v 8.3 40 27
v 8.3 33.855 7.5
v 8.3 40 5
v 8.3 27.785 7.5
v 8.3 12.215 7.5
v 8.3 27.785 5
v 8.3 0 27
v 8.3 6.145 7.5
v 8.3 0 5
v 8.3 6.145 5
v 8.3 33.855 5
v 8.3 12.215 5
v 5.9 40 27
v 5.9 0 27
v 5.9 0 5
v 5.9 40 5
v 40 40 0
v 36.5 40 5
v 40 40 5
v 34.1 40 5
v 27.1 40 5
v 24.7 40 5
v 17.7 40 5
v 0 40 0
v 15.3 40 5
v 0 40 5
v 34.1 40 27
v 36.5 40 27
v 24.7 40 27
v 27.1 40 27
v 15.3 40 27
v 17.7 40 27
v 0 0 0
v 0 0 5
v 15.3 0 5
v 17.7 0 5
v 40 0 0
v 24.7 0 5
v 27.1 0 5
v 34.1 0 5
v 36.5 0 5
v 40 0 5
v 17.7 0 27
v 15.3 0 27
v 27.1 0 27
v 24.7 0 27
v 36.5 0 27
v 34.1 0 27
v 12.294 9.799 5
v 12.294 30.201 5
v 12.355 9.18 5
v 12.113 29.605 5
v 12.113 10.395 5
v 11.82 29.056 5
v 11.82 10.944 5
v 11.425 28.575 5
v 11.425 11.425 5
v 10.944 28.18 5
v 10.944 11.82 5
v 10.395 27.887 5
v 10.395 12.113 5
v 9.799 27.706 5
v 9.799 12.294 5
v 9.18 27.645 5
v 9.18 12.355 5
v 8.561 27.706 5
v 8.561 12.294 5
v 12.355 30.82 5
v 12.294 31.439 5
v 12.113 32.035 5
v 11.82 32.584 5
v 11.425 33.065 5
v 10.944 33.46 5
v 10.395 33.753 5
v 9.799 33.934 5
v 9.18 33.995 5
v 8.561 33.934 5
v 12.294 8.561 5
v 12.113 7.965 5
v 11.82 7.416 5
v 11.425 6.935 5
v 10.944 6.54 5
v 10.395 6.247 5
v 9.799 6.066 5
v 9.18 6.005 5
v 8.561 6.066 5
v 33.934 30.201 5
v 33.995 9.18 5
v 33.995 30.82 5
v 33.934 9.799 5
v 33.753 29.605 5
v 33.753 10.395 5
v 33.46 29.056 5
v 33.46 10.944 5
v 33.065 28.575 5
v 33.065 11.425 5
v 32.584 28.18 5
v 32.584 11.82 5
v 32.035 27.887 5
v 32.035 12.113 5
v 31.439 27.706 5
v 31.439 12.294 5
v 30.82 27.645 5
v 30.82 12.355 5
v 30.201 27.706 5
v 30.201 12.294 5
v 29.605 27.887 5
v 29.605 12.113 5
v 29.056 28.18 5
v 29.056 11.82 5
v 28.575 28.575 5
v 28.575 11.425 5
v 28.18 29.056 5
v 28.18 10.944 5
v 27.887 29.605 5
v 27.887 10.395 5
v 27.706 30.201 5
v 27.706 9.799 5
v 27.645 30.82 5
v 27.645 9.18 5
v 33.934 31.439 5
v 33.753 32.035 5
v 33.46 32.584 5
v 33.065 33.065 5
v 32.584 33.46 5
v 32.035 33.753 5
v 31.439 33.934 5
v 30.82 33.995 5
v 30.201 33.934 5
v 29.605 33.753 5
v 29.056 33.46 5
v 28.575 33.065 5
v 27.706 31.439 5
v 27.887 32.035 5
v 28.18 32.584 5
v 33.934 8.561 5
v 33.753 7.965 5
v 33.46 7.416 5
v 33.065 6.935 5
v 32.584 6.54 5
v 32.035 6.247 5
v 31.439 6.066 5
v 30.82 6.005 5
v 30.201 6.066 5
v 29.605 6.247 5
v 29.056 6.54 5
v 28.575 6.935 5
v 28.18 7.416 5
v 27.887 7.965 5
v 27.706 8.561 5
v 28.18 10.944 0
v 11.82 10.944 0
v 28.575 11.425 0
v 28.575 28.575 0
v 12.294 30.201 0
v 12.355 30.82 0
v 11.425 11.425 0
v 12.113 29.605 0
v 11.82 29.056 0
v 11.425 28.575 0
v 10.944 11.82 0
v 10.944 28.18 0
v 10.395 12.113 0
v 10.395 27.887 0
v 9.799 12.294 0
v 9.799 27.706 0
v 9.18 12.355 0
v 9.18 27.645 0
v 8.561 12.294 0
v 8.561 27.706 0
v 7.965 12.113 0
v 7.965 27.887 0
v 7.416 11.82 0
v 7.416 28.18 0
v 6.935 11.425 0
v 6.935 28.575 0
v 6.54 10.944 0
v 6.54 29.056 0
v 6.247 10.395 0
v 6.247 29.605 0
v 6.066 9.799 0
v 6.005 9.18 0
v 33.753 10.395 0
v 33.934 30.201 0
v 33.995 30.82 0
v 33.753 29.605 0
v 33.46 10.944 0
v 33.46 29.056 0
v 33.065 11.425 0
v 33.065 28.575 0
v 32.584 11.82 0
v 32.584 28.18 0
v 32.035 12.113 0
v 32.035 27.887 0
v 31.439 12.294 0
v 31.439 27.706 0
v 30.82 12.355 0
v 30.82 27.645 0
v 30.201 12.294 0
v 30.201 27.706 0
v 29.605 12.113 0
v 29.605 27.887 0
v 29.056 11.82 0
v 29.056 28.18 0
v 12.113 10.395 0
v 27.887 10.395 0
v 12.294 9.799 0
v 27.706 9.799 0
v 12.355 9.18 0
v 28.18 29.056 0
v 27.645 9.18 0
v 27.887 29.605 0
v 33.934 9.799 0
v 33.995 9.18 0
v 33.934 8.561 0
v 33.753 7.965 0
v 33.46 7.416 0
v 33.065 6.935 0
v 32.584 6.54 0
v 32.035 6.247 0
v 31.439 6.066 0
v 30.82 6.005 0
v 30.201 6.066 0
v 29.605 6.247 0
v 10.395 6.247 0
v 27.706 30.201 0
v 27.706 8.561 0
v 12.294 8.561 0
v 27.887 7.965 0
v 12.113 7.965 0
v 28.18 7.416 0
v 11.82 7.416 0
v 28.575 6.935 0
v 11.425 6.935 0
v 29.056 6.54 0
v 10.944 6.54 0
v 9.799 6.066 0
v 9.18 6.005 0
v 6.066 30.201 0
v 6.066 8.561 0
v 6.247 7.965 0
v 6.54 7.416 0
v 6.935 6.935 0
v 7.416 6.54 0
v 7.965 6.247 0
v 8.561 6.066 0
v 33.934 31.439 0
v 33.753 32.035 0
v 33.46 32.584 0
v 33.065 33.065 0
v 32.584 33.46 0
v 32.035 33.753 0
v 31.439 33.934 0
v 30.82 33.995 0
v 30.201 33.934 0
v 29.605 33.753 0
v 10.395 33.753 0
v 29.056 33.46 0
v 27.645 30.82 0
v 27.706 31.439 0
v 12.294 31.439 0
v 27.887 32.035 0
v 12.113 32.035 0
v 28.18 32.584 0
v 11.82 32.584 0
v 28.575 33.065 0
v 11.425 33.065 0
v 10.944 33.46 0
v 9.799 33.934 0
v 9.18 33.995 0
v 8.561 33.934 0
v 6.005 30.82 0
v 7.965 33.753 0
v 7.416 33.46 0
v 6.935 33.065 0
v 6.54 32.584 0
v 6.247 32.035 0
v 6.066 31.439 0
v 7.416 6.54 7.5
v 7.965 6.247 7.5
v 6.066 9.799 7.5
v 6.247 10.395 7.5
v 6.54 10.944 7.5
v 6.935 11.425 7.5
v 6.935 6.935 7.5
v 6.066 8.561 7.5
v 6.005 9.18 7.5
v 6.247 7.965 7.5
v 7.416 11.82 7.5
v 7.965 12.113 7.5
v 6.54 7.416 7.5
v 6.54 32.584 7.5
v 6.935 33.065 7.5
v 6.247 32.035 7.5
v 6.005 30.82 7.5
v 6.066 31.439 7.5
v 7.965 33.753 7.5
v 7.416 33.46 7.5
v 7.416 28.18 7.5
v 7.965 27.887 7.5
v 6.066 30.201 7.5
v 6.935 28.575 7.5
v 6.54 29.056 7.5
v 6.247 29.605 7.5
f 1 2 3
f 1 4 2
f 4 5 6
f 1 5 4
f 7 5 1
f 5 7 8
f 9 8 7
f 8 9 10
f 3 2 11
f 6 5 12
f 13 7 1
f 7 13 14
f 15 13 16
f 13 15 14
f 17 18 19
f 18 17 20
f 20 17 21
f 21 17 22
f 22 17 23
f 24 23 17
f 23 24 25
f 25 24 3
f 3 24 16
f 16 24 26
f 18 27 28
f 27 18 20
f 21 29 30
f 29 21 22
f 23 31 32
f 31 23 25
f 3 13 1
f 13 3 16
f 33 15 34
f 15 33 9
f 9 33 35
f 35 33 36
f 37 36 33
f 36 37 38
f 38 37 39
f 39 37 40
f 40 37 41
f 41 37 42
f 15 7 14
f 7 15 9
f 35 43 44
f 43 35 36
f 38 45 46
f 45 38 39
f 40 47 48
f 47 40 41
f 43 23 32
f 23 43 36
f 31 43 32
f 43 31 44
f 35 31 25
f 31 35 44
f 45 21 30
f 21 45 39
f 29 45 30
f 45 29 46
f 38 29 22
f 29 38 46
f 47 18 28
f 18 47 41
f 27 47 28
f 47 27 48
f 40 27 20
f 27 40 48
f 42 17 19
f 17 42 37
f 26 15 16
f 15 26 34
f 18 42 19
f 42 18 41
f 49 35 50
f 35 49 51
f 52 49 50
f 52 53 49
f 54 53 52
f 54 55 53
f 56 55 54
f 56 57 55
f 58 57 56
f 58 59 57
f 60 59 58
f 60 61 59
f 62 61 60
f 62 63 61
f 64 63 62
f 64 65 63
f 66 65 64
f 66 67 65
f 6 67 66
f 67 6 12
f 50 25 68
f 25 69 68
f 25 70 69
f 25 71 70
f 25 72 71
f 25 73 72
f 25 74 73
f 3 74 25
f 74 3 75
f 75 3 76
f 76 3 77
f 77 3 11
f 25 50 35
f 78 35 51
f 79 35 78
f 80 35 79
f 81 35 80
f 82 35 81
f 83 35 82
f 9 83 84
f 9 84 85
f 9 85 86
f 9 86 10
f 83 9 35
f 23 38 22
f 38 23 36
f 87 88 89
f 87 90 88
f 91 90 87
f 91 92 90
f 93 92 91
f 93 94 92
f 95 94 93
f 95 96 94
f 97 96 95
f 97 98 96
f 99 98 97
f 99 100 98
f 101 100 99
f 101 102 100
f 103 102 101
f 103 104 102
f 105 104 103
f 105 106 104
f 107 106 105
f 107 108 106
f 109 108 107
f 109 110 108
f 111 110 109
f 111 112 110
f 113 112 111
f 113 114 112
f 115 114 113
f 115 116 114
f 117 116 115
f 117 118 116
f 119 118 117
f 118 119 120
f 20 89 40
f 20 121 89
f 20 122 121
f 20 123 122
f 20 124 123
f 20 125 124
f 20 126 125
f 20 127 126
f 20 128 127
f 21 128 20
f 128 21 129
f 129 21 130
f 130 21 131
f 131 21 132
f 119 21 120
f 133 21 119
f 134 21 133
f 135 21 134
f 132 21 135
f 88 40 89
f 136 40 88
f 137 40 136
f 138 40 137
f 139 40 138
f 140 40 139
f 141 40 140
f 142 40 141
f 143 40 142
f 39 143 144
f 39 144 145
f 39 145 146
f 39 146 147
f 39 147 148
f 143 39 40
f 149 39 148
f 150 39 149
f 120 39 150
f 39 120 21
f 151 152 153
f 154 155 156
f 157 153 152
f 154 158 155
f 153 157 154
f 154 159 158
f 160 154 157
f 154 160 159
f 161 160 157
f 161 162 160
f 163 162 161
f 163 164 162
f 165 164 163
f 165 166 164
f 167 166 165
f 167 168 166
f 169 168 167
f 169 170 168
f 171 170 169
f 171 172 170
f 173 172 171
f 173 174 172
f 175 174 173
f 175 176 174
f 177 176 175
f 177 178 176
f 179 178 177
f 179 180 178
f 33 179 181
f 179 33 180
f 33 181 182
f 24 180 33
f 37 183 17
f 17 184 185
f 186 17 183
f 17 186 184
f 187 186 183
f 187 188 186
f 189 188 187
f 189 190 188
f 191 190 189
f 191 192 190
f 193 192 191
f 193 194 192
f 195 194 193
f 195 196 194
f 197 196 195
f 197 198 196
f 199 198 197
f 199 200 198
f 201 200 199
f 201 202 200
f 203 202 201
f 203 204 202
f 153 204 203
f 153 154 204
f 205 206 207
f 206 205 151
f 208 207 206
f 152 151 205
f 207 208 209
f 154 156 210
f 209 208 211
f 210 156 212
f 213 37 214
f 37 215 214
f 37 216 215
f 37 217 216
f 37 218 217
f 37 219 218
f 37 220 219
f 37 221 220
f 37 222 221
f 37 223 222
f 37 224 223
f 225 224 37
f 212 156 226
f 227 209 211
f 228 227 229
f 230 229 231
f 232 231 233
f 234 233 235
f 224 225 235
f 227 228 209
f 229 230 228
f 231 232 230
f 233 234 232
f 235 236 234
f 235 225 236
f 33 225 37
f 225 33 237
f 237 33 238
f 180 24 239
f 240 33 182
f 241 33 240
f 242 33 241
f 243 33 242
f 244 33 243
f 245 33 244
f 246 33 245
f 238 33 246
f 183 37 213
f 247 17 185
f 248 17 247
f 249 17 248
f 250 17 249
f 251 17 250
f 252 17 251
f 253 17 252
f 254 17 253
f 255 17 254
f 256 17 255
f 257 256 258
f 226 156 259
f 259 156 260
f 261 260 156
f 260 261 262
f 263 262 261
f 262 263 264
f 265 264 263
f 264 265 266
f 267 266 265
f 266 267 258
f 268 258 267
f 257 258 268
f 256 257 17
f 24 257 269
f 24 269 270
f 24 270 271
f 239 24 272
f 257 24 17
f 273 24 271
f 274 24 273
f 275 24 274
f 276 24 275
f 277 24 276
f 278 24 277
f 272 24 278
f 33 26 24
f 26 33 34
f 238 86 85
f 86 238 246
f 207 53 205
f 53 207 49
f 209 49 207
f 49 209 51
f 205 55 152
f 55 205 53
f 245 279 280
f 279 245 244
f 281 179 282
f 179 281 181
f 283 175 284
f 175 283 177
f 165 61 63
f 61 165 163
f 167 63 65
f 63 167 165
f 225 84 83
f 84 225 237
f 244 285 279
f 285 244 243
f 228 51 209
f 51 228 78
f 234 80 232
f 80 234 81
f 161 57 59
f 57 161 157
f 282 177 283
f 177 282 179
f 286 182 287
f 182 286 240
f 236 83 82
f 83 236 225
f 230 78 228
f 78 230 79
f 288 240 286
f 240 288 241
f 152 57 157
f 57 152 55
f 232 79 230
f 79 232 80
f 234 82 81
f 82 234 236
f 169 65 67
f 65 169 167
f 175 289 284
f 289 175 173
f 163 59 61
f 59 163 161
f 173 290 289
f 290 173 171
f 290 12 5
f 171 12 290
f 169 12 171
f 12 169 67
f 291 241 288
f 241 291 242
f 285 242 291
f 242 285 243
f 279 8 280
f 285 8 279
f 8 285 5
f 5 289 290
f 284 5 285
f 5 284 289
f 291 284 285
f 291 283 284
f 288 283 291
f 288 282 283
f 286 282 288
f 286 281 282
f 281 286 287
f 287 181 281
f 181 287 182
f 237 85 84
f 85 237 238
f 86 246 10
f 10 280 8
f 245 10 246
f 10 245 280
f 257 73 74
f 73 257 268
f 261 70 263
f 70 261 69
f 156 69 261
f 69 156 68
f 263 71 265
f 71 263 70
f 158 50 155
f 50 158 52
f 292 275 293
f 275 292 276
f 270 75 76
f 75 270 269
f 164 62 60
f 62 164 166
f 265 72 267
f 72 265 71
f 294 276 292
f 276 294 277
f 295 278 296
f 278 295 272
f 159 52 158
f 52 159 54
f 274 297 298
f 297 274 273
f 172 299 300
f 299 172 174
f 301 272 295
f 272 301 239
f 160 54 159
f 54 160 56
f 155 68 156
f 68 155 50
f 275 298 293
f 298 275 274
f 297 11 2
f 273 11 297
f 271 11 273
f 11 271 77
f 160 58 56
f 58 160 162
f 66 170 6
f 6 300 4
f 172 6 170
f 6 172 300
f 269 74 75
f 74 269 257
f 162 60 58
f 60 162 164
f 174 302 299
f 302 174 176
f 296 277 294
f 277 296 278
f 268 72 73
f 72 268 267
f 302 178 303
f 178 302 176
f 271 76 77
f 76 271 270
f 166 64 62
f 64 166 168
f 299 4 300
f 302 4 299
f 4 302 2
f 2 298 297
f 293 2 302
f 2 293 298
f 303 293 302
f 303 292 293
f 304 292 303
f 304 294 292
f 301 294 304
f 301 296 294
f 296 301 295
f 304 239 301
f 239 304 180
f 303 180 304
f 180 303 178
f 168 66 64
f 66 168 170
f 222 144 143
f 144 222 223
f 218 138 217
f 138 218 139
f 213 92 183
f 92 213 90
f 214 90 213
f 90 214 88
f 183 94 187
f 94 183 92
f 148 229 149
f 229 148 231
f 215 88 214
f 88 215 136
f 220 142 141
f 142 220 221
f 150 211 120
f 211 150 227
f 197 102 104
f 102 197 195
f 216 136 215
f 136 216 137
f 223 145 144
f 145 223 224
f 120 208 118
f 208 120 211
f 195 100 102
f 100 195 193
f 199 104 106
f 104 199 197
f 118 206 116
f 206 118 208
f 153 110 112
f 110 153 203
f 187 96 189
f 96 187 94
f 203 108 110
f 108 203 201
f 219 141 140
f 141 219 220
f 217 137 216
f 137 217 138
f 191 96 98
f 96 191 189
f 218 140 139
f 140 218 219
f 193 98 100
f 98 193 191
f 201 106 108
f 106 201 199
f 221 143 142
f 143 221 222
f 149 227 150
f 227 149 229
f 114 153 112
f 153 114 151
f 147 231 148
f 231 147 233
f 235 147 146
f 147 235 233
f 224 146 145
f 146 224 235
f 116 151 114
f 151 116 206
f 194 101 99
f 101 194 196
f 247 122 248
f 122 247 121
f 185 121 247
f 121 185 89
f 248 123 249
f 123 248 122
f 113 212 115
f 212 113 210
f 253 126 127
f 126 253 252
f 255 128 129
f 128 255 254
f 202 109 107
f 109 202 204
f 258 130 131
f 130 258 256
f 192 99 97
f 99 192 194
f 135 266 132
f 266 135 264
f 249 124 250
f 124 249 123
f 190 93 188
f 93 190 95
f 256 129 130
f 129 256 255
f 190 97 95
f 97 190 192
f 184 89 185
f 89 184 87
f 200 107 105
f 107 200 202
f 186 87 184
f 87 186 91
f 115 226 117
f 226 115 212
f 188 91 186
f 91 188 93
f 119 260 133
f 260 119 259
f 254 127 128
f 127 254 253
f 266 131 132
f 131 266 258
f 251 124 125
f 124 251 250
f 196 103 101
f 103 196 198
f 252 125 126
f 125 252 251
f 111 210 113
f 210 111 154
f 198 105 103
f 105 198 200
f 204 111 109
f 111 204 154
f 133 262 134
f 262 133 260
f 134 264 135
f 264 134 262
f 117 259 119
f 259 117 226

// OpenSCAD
$fn = 32;

// ----------------------------------------------------------------------
// Finned heat sink: 40 x 40 mm base, 22 mm fins
// ----------------------------------------------------------------------

// --- parameters (mm) ---
base_w = 40;              // base width
base_d = 40;              // base depth
base_t = 5;               // base thickness
fin_h = 22;               // fin height above the base
holes_d = 6.35;           // fixing holes
hole_x = 10.82;           // hole offset in x
hole_y = 10.82;           // hole offset in y
fin_t = 2.4;              // fin thickness
fin_pitch = 9.4;          // fin pitch
fin_count = 4;            // number of fins
fin_x0 = 5.9;             // first fin offset

difference() {
  union() {
    cube([base_w, base_d, base_t]);
    for (i = [0 : fin_count - 1]) {
      translate([fin_x0 + i * fin_pitch, 0, base_t - 0.5]) cube([fin_t, base_d, fin_h + 0.5]);
    }
  }
  /* fixing holes through the base, 2.5 mm clear on both sides */
  for (hx = [-10.82, 10.82]) {
    for (hy = [-10.82, 10.82]) {
      translate([base_w / 2 + hx, base_d / 2 + hy, -2.5]) cylinder(h = base_t + 5, d = holes_d);
    }
  }
}
